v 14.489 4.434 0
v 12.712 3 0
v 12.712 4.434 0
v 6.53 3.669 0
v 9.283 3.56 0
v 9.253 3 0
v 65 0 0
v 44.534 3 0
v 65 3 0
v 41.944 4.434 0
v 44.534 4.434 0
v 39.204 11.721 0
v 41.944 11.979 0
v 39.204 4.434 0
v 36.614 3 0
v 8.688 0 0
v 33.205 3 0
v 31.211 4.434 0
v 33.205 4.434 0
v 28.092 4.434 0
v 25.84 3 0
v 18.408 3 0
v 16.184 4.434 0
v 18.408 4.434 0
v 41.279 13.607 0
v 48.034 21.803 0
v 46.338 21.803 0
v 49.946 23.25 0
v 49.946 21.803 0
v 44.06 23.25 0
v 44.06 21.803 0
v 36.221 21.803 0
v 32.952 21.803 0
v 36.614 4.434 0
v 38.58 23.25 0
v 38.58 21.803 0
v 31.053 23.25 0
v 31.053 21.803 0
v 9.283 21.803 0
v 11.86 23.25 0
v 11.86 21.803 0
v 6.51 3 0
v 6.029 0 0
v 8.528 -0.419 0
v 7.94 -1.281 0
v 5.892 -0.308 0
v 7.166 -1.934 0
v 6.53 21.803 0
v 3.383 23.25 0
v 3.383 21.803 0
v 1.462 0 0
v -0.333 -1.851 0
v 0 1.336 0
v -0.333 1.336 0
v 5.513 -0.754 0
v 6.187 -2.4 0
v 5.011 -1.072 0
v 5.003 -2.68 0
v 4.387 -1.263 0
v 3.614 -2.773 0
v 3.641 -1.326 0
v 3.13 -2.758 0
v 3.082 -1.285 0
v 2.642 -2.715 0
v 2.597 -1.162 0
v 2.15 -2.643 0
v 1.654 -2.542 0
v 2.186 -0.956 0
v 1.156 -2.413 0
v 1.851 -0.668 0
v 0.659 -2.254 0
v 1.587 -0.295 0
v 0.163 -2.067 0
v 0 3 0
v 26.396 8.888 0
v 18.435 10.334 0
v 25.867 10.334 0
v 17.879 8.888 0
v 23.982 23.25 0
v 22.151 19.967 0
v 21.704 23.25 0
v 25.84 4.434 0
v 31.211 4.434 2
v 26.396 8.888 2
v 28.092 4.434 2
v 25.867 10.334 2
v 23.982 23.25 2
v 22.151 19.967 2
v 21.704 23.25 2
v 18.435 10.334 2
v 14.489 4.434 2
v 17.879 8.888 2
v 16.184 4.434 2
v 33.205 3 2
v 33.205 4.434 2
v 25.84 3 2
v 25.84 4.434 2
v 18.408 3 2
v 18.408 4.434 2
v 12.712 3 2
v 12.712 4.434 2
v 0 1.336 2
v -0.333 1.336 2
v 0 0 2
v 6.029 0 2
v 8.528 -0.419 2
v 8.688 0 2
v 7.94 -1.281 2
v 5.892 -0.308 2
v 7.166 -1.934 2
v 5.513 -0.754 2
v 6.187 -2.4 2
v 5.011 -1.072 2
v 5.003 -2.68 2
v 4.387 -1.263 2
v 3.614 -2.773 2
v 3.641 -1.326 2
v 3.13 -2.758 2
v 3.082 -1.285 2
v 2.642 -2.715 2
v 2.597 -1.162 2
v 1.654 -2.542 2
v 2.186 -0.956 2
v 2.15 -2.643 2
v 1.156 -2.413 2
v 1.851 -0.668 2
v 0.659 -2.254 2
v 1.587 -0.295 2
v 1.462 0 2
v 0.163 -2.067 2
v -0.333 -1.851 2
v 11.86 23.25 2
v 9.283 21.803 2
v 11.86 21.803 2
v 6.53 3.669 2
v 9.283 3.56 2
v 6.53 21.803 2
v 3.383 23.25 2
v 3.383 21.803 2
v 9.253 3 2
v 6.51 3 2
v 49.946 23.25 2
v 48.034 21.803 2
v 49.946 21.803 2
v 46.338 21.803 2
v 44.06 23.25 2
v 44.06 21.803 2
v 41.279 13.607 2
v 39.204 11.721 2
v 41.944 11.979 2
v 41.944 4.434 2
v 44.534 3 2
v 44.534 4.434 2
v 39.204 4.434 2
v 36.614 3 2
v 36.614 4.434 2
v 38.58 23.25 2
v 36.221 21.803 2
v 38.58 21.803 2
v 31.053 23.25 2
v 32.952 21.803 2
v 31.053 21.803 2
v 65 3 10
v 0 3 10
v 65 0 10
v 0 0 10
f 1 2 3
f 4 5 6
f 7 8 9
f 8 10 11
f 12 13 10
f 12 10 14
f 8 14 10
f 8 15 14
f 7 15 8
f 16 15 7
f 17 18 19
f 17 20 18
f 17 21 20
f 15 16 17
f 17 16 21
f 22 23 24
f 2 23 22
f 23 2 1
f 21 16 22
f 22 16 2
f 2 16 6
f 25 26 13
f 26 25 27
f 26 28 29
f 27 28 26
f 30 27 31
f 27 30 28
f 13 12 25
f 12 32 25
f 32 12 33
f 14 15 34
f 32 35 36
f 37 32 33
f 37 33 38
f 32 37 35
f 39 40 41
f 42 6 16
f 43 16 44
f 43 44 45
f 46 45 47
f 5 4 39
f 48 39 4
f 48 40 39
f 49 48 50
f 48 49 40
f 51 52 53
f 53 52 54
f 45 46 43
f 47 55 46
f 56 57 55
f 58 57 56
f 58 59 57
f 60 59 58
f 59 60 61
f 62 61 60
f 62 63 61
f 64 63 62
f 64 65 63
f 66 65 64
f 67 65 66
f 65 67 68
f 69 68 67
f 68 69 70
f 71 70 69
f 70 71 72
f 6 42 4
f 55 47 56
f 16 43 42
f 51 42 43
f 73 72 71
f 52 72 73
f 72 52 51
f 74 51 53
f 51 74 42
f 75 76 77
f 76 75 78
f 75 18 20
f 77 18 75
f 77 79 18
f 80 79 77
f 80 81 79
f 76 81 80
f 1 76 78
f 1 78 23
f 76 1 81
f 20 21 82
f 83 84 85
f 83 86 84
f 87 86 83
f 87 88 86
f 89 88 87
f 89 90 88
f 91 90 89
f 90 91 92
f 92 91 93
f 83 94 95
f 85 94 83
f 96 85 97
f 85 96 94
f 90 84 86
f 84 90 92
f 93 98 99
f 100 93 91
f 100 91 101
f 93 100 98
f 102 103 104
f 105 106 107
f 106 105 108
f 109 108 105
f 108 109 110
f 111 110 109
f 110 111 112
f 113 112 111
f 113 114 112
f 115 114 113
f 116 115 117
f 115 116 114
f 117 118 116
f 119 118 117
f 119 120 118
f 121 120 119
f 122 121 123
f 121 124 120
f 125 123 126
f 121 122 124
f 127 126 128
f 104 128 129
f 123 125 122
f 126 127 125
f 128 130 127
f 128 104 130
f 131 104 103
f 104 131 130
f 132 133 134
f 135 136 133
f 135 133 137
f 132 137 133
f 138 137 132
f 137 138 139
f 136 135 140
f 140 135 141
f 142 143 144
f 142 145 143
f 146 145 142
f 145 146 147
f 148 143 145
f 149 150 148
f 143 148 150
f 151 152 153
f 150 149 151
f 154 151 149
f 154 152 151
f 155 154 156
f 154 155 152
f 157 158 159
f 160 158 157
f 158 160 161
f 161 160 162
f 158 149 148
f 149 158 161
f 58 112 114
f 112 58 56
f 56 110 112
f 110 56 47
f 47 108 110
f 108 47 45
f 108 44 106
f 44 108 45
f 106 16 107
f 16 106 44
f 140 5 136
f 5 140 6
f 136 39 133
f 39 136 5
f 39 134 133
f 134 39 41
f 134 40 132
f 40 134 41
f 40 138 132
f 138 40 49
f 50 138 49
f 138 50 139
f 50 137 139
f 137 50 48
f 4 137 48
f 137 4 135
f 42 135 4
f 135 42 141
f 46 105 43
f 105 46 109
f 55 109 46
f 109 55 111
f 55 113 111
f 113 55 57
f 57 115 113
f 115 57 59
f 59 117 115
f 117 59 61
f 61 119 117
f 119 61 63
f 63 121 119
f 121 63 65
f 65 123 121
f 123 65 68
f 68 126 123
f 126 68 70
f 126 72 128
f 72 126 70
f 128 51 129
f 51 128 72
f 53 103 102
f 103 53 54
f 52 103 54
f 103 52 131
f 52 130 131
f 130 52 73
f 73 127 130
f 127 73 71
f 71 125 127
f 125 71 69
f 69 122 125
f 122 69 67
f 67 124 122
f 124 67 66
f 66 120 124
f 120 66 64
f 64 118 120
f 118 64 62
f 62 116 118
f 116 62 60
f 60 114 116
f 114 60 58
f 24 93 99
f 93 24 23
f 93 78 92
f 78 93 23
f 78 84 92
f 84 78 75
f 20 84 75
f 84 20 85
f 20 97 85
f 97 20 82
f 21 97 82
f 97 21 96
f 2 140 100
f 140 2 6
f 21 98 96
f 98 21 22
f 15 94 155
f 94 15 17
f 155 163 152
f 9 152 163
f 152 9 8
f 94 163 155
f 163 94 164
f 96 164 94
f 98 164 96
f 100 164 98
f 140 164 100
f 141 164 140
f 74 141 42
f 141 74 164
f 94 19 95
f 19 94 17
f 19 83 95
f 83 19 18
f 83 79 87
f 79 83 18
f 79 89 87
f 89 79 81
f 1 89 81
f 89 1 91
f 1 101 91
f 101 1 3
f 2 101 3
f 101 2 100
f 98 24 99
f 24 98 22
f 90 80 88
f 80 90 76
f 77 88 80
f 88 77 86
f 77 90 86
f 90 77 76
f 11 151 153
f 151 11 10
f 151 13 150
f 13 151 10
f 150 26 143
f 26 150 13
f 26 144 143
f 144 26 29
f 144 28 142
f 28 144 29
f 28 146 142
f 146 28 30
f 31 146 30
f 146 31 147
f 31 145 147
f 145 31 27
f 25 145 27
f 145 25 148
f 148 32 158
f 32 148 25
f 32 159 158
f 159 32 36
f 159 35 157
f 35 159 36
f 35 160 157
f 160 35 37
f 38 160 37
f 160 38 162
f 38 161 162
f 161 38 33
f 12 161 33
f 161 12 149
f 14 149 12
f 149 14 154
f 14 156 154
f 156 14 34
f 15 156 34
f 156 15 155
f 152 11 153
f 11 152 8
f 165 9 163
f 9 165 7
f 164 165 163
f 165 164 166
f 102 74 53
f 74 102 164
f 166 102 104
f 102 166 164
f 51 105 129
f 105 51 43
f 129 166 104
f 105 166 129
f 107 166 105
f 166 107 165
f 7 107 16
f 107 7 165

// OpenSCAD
translate([2, 3, 0])
linear_extrude(height=2)
    text("JAY", 20, "Georgia");

cube([65, 3, 10]);
